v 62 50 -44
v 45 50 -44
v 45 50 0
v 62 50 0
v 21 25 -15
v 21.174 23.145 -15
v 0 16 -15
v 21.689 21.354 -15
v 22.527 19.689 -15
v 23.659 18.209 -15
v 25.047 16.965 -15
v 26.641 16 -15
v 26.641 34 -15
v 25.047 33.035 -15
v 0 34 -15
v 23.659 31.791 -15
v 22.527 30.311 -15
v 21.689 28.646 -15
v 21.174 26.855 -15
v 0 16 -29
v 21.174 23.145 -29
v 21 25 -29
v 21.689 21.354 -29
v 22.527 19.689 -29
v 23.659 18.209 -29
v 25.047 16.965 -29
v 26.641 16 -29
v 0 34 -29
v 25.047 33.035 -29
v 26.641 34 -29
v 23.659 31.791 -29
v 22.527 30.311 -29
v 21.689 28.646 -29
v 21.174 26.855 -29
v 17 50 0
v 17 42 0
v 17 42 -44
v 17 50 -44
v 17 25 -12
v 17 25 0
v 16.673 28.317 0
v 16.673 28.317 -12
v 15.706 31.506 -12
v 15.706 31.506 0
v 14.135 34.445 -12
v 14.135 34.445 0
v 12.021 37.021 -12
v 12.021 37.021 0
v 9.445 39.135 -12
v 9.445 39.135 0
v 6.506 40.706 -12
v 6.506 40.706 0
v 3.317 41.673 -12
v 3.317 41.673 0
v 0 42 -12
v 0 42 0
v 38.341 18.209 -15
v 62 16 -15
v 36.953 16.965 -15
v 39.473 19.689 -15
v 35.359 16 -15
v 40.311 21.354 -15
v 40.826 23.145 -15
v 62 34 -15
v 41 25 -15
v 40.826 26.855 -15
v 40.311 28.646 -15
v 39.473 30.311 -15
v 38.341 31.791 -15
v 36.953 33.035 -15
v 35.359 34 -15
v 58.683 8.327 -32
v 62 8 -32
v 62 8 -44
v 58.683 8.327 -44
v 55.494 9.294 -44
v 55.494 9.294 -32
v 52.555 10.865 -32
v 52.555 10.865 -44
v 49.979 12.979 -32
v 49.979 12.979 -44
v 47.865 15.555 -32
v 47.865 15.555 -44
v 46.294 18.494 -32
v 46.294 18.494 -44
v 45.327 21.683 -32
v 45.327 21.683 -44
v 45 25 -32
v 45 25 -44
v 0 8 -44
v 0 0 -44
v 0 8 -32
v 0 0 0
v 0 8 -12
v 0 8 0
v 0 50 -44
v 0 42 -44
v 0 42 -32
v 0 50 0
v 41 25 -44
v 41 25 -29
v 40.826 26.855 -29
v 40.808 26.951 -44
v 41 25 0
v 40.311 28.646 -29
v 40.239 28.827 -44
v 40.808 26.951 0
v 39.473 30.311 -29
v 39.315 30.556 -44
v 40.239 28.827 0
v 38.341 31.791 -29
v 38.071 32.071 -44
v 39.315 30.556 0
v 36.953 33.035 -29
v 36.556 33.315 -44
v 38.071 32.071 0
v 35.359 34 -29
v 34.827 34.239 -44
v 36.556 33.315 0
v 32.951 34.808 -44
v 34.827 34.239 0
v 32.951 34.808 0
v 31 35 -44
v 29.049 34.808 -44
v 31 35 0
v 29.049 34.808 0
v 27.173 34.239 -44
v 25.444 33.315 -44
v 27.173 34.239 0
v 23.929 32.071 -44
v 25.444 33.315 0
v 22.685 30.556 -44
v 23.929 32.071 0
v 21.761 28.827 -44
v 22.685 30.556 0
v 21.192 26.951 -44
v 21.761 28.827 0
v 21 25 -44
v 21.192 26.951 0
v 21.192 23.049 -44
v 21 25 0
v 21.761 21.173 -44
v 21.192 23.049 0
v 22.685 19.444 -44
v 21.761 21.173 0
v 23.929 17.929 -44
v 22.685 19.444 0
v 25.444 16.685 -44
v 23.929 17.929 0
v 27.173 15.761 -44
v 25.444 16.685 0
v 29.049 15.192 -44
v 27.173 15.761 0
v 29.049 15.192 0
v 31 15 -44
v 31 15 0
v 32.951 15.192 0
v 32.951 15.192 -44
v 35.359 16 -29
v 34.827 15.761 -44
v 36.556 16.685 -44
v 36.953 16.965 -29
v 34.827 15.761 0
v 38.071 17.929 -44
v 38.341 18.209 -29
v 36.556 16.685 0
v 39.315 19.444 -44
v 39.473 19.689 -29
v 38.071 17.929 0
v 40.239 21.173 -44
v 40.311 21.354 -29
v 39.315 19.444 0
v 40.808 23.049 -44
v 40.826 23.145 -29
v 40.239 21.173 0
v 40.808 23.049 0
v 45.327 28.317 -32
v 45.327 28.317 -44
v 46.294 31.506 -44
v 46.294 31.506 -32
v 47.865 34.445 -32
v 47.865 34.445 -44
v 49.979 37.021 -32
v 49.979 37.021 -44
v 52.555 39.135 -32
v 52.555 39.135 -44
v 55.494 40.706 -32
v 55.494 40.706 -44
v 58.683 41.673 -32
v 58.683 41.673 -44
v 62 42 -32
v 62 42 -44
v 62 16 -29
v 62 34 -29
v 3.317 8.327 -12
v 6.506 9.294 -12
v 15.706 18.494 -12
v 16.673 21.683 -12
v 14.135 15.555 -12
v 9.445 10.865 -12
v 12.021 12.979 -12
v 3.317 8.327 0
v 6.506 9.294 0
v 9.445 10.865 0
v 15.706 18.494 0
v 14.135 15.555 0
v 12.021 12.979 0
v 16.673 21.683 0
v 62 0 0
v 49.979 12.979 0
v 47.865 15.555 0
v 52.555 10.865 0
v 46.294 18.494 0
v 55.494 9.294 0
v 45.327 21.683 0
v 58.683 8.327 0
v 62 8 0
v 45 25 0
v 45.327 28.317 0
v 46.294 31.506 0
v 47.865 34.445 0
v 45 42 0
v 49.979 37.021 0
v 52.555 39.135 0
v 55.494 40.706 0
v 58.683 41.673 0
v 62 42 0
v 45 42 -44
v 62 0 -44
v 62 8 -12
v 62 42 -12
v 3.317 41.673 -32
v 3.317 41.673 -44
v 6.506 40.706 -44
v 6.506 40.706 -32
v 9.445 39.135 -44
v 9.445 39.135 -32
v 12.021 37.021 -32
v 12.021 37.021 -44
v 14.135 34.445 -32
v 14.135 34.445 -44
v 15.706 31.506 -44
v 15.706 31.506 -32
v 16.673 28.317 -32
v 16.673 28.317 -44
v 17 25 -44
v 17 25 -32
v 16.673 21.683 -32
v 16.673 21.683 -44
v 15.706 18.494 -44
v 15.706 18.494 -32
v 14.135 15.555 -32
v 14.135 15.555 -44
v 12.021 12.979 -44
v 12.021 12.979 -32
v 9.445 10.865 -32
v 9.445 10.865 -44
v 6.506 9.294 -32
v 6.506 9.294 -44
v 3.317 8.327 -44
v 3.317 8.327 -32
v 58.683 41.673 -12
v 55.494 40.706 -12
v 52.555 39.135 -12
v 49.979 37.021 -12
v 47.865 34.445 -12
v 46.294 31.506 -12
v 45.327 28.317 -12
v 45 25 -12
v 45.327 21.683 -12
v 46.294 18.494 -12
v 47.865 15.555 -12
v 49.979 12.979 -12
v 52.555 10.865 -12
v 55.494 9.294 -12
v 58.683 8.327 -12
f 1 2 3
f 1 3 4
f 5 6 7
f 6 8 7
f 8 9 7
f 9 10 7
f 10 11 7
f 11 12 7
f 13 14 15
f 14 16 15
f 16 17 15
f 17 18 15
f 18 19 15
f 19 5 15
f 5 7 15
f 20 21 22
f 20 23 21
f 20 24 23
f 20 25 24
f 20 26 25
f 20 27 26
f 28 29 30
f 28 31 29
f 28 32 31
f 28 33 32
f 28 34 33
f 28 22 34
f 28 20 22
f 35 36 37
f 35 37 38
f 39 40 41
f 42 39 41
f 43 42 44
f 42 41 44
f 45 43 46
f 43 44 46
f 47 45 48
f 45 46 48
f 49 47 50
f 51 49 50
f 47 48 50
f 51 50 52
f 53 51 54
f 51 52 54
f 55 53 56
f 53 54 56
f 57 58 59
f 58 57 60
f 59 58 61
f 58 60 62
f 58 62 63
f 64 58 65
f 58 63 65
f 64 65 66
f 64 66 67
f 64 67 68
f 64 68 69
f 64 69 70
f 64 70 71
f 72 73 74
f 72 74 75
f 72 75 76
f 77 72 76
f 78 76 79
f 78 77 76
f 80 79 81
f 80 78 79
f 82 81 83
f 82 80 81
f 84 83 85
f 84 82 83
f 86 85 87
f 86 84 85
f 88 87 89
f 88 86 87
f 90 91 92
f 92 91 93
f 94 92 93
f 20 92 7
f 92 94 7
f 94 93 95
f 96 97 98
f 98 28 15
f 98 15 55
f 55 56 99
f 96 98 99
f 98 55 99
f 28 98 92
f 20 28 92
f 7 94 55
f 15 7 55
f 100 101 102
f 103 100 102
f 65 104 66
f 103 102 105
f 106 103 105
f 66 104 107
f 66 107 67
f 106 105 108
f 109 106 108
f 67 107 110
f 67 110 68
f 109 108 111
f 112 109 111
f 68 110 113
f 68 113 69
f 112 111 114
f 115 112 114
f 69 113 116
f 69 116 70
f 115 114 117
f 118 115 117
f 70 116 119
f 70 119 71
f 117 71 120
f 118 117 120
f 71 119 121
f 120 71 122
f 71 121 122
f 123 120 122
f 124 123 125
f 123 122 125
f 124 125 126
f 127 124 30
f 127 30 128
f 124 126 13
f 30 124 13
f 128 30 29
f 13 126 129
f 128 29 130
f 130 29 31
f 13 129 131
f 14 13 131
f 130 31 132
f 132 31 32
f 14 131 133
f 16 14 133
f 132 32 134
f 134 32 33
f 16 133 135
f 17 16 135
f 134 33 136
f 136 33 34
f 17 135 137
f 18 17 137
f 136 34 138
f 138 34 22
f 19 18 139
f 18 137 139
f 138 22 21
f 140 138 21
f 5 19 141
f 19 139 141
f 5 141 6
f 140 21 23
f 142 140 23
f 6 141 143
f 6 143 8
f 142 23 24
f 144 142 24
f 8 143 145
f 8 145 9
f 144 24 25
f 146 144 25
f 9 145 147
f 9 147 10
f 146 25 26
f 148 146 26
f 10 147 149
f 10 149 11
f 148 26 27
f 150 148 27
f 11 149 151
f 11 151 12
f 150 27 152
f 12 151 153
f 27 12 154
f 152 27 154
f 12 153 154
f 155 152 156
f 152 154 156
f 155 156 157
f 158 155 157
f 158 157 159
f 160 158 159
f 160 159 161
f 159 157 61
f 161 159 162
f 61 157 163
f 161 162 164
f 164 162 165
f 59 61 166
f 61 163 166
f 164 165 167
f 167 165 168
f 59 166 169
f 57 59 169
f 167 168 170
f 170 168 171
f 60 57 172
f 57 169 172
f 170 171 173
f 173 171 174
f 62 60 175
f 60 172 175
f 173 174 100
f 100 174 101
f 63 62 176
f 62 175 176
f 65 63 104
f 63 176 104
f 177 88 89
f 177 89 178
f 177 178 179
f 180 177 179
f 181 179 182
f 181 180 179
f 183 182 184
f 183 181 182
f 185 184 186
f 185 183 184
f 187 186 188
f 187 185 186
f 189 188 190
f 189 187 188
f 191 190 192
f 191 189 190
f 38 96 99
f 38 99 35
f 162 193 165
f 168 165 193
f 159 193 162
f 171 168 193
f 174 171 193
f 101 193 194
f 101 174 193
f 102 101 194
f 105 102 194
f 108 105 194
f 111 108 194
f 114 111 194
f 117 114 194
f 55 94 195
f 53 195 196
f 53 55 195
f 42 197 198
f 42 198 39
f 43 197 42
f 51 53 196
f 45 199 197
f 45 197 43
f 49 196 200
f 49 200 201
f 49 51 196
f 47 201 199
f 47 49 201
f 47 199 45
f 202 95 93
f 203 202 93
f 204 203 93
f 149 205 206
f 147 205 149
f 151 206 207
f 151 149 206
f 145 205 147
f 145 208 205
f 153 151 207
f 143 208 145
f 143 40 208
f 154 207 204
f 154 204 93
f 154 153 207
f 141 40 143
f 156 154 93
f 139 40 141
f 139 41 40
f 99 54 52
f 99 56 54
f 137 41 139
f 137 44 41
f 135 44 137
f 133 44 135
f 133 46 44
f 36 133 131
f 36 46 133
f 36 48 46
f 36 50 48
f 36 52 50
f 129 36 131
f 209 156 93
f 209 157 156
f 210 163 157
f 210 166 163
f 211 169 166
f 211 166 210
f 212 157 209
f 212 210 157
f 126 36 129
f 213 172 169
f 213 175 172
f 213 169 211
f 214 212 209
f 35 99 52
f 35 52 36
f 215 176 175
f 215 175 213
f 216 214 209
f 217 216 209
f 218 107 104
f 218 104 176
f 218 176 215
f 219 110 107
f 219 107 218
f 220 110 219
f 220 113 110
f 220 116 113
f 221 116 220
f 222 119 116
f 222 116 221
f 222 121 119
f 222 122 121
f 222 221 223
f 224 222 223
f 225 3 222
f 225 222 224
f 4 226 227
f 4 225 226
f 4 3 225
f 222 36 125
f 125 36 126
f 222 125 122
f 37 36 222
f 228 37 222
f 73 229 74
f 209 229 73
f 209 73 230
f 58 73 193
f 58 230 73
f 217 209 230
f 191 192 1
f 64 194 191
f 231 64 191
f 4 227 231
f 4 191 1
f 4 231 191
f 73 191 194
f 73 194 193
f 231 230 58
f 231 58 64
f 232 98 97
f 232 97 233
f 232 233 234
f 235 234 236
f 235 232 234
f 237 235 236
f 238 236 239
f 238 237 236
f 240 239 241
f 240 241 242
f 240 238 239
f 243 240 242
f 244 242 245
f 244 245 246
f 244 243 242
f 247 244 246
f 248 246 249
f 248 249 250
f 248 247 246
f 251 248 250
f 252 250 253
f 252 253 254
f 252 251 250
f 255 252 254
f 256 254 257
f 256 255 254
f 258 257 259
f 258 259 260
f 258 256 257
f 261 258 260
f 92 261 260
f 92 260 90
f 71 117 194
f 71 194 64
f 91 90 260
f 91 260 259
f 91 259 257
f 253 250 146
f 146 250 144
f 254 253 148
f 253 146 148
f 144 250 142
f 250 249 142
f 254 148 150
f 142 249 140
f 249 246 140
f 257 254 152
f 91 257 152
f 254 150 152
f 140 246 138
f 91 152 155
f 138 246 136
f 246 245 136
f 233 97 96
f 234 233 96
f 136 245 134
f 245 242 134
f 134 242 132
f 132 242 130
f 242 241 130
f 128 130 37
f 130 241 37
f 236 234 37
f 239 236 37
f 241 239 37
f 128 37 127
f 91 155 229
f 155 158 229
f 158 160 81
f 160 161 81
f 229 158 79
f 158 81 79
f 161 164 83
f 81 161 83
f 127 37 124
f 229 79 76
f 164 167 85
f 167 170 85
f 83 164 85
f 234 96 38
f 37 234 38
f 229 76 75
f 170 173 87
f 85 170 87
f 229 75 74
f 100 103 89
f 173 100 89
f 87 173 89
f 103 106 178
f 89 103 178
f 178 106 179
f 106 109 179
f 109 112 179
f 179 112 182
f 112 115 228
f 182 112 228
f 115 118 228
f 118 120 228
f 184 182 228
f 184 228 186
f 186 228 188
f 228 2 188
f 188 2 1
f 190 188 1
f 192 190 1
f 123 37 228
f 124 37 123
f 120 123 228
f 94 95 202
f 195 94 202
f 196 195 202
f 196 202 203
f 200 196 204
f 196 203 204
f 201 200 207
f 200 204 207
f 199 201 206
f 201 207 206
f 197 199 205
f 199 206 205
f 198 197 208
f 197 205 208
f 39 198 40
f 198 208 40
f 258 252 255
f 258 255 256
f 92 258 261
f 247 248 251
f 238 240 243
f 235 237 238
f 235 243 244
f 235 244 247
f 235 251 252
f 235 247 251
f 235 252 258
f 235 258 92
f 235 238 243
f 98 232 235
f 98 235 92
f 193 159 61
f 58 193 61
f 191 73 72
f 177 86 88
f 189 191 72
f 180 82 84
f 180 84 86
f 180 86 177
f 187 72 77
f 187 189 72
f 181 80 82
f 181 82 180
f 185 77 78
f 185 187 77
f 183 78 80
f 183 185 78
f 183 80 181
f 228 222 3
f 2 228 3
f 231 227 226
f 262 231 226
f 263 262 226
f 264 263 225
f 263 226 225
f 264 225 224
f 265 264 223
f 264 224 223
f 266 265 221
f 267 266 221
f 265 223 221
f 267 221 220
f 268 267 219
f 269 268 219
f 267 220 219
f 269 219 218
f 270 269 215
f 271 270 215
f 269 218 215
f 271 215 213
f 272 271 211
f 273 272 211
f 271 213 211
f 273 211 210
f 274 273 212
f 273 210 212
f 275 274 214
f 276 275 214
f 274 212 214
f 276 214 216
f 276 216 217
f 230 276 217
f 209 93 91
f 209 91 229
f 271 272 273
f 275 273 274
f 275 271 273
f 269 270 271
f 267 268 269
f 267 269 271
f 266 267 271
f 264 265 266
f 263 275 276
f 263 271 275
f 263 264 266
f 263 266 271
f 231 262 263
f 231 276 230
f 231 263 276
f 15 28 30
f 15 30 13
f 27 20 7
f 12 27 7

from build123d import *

# Parameters (mm, degrees)
SKETCH1_W           = 62
SKETCH1_H           = 50
BOSS_EXTRUDE1_DEPTH = 44
SKETCH2_R           = 10
CUT_EXTRUDE1_DEPTH  = 56
CUT_EXTRUDE2_DEPTH  = 12
CUT_EXTRUDE3_START  = -12
CUT_EXTRUDE3_DEPTH  = 12
SKETCH5_W           = 28
SKETCH5_H           = 8
CUT_EXTRUDE4_DEPTH  = 71
SKETCH6_W           = 14
SKETCH6_H           = 18
CUT_EXTRUDE5_DEPTH  = 71


with BuildPart() as part:
    # Sketch1 → Boss-Extrude1 (new body)
    with BuildSketch(Plane.XY):
        with Locations((31, 25)):
            Rectangle(SKETCH1_W, SKETCH1_H)
    extrude(amount=-BOSS_EXTRUDE1_DEPTH)

    # Sketch2 → Cut-Extrude1 (cut)
    with BuildSketch(Plane.XY):
        with Locations((31, 25)):
            Circle(SKETCH2_R)
    extrude(amount=-CUT_EXTRUDE1_DEPTH, mode=Mode.SUBTRACT)

    # Sketch3 → Cut-Extrude2 (cut)
    with BuildSketch(Plane.XY):
        with BuildLine():
            ThreePointArc((17, 25), (12.02081528, 37.02081528), (0, 42))
            Line((0, 42), (0, 8))
            ThreePointArc((0, 8), (12.02081528, 12.97918472), (17, 25))
        make_face()
        with BuildLine():
            Line((0, 8), (0, 42))
            ThreePointArc((0, 42), (-17, 25), (0, 8))
        make_face()
        with BuildLine():
            ThreePointArc((79, 25), (74.02081528, 37.02081528), (62, 42))
            Line((62, 42), (62, 8))
            ThreePointArc((62, 8), (74.02081528, 12.97918472), (79, 25))
        make_face()
        with BuildLine():
            Line((62, 8), (62, 42))
            ThreePointArc((62, 42), (45, 25), (62, 8))
        make_face()
    extrude(amount=-CUT_EXTRUDE2_DEPTH, mode=Mode.SUBTRACT)

    # Sketch4 → Cut-Extrude3 (cut)
    with BuildSketch(Plane(origin=(0, 0, -44), x_dir=(-1, 0, 0), z_dir=(0, 0, -1)).offset(CUT_EXTRUDE3_START)):
        with BuildLine():
            ThreePointArc((-62, 42), (-79, 25), (-62, 8))
            Line((-62, 8), (-62, 42))
        make_face()
        with BuildLine():
            Line((-62, 42), (-62, 8))
            ThreePointArc((-62, 8), (-49.97918472, 12.97918472), (-45, 25))
            ThreePointArc((-45, 25), (-49.97918472, 37.02081528), (-62, 42))
        make_face()
        with BuildLine():
            ThreePointArc((0, 42), (-17, 25), (0, 8))
            Line((0, 8), (0, 42))
        make_face()
        with BuildLine():
            Line((0, 42), (0, 8))
            ThreePointArc((0, 8), (12.02081528, 12.97918472), (17, 25))
            ThreePointArc((17, 25), (12.02081528, 37.02081528), (0, 42))
        make_face()
    extrude(amount=CUT_EXTRUDE3_DEPTH, mode=Mode.SUBTRACT)

    # Sketch5 → Cut-Extrude4 (cut)
    with BuildSketch(Plane.XY):
        with Locations((31, 46)):
            Rectangle(SKETCH5_W, SKETCH5_H)
    extrude(amount=-CUT_EXTRUDE4_DEPTH, mode=Mode.SUBTRACT)

    # Sketch6 → Cut-Extrude5 (cut)
    with BuildSketch(Plane.ZY):
        with Locations((-22, 25)):
            Rectangle(SKETCH6_W, SKETCH6_H)
    extrude(amount=-CUT_EXTRUDE5_DEPTH, mode=Mode.SUBTRACT)


solid = part.part
